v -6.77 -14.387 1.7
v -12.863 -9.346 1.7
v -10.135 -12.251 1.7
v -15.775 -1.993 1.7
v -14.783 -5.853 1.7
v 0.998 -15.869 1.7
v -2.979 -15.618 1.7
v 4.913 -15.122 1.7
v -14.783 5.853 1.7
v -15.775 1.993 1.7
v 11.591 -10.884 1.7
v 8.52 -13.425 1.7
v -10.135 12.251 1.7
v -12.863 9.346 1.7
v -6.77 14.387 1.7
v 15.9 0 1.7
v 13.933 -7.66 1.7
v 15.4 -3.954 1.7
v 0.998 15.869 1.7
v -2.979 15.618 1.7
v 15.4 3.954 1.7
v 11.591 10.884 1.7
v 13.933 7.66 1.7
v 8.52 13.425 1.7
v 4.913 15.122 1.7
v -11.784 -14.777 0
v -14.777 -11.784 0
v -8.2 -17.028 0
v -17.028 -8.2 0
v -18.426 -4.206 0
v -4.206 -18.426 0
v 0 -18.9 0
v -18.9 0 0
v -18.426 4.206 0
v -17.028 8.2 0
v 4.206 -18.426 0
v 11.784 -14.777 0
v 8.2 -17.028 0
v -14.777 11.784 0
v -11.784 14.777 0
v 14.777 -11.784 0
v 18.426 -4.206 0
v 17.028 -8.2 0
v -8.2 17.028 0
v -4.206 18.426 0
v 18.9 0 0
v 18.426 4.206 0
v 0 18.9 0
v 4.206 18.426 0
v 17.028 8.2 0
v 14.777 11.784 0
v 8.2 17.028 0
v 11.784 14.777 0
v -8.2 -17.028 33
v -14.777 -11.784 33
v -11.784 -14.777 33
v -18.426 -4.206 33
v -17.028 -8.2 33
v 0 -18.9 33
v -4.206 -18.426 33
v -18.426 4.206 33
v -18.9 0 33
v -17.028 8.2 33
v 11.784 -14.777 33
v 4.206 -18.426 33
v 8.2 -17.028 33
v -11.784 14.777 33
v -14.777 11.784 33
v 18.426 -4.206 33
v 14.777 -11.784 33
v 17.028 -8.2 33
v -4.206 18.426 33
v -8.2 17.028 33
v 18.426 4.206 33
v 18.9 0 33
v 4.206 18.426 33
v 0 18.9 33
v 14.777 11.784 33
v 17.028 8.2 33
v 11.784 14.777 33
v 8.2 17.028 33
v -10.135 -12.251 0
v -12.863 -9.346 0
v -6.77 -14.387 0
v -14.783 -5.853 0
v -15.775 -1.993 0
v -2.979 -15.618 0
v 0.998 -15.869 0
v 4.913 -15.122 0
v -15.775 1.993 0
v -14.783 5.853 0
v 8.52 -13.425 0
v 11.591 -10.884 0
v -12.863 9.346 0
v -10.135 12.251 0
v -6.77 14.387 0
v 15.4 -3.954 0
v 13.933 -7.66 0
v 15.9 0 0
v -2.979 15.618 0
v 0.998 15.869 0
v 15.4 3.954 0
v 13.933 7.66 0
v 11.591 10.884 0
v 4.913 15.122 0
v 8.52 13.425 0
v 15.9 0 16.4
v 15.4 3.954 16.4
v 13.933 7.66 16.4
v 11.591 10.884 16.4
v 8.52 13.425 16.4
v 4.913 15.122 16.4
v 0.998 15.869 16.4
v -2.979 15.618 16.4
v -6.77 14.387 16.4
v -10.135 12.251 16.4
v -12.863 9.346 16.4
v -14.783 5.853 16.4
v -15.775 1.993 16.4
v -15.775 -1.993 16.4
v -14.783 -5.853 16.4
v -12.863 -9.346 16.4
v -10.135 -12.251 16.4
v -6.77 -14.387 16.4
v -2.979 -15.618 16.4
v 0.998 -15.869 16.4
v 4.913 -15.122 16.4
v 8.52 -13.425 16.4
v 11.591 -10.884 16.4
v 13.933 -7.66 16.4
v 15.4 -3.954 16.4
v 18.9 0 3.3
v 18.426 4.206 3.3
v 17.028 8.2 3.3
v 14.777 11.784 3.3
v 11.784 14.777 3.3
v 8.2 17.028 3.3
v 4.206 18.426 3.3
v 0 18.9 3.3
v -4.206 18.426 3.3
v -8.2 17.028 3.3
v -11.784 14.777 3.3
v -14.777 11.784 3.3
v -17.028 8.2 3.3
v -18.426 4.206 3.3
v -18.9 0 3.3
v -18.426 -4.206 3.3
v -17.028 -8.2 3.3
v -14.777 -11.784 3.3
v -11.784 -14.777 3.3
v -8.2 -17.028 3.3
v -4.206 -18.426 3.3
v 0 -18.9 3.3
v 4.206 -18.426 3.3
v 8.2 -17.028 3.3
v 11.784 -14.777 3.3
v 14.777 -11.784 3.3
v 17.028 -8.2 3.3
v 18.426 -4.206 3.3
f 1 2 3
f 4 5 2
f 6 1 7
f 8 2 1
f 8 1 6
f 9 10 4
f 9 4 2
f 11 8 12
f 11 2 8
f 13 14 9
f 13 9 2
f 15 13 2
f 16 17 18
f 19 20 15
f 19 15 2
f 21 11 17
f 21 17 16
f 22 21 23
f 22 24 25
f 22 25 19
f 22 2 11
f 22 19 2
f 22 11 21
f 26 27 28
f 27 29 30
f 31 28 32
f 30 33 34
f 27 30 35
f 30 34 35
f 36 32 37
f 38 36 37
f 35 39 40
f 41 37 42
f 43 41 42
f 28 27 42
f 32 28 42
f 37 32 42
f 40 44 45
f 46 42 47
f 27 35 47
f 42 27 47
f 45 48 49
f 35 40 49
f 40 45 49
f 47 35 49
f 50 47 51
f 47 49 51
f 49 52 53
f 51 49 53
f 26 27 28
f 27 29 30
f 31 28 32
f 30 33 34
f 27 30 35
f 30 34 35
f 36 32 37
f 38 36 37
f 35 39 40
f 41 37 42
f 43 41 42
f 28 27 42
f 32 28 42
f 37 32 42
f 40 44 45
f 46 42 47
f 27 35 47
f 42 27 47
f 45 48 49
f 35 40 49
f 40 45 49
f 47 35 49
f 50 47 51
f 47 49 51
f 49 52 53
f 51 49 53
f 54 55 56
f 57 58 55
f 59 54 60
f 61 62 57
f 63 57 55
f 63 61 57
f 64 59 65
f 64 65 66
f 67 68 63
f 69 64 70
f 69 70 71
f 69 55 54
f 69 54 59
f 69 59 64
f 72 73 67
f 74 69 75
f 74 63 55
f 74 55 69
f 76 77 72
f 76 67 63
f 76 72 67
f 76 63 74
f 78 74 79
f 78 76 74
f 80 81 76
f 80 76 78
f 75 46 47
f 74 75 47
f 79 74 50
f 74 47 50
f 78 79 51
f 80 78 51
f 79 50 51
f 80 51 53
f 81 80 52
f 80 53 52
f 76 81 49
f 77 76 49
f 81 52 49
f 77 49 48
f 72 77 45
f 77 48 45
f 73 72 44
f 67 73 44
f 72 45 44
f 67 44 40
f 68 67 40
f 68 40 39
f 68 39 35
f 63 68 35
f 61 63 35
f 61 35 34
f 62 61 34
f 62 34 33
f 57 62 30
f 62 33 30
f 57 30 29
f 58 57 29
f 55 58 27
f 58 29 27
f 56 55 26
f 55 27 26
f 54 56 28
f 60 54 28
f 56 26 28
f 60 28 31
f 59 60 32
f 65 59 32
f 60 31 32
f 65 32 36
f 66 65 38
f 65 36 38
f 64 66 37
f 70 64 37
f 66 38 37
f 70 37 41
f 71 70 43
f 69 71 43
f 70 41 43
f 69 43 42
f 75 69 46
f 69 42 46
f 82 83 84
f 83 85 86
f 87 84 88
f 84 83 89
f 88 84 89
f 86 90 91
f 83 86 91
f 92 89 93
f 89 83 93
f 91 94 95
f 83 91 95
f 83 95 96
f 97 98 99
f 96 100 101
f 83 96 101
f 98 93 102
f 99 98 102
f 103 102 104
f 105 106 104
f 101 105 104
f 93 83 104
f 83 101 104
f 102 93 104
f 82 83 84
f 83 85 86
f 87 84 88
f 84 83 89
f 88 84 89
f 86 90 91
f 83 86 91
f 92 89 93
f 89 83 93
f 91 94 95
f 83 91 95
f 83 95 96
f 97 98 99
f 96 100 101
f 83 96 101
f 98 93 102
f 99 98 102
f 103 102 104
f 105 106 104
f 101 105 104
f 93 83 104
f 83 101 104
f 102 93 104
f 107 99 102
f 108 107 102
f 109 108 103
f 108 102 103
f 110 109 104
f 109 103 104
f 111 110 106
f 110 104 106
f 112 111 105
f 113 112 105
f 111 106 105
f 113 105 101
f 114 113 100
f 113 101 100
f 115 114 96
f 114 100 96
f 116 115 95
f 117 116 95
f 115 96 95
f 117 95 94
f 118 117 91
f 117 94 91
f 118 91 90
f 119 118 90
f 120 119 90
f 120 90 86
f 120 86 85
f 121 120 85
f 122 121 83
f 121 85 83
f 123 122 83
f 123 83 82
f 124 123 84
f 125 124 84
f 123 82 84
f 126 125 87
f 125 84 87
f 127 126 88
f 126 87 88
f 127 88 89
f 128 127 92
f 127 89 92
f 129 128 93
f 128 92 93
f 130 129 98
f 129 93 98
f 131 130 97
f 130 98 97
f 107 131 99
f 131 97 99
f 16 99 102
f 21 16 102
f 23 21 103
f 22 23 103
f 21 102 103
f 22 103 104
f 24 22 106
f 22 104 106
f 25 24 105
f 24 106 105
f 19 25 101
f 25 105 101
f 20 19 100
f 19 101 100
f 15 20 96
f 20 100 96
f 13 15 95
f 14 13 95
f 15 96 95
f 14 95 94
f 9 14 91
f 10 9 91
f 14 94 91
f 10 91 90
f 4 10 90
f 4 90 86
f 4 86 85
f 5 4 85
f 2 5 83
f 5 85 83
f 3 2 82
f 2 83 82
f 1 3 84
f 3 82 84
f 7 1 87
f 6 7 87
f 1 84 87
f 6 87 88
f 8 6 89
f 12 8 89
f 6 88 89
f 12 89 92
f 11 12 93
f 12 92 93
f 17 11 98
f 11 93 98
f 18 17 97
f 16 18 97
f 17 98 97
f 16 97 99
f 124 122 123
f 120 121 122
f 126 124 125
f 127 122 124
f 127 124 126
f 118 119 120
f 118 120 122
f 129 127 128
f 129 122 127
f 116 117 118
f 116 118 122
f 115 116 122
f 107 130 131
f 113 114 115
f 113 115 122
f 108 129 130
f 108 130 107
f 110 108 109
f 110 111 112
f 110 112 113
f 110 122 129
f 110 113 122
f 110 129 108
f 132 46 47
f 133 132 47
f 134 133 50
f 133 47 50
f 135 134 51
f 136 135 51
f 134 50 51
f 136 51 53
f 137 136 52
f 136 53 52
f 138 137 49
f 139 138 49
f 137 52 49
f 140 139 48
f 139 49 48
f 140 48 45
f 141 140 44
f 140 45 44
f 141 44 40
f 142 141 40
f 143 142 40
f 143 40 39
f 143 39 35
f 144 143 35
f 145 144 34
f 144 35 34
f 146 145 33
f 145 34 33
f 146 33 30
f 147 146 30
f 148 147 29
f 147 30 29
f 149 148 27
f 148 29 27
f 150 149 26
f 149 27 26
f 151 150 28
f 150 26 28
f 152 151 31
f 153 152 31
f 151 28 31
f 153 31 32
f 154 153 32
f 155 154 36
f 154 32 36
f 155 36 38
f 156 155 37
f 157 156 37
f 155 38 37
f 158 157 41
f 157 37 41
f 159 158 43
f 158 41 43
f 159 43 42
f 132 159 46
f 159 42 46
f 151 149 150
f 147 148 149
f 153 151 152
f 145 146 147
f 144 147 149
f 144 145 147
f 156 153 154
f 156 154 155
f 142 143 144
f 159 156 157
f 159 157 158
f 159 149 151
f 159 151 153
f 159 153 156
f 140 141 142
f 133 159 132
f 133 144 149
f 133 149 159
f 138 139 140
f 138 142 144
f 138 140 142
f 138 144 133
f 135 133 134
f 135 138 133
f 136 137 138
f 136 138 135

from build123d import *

# Parameters (mm, degrees)
F0_R     = 18.9
F1_DEPTH = 3.3
F2_R     = 15.9
F3_DEPTH = 1.7
F4_DEPTH = 16.4
F5_DEPTH = 33


with BuildPart() as f1:
    # F0 (on Top) → F1 (new body)
    with BuildSketch(Plane.XY):
        Circle(F0_R)
    extrude(amount=F1_DEPTH)


with BuildPart() as f3:
    # F2 (on Top) → F3 (new body)
    with BuildSketch(Plane.XY):
        Circle(F2_R)
    extrude(amount=F3_DEPTH)


with BuildPart() as f4:
    # F2 (on Top) → F4 (new body)
    with BuildSketch(Plane.XY):
        Circle(F2_R)
    extrude(amount=F4_DEPTH)


with BuildPart() as f5:
    # F0 (on Top) → F5 (new body)
    with BuildSketch(Plane.XY):
        Circle(F0_R)
    extrude(amount=F5_DEPTH)


solid = Compound([f1.part, f3.part, f4.part, f5.part])
